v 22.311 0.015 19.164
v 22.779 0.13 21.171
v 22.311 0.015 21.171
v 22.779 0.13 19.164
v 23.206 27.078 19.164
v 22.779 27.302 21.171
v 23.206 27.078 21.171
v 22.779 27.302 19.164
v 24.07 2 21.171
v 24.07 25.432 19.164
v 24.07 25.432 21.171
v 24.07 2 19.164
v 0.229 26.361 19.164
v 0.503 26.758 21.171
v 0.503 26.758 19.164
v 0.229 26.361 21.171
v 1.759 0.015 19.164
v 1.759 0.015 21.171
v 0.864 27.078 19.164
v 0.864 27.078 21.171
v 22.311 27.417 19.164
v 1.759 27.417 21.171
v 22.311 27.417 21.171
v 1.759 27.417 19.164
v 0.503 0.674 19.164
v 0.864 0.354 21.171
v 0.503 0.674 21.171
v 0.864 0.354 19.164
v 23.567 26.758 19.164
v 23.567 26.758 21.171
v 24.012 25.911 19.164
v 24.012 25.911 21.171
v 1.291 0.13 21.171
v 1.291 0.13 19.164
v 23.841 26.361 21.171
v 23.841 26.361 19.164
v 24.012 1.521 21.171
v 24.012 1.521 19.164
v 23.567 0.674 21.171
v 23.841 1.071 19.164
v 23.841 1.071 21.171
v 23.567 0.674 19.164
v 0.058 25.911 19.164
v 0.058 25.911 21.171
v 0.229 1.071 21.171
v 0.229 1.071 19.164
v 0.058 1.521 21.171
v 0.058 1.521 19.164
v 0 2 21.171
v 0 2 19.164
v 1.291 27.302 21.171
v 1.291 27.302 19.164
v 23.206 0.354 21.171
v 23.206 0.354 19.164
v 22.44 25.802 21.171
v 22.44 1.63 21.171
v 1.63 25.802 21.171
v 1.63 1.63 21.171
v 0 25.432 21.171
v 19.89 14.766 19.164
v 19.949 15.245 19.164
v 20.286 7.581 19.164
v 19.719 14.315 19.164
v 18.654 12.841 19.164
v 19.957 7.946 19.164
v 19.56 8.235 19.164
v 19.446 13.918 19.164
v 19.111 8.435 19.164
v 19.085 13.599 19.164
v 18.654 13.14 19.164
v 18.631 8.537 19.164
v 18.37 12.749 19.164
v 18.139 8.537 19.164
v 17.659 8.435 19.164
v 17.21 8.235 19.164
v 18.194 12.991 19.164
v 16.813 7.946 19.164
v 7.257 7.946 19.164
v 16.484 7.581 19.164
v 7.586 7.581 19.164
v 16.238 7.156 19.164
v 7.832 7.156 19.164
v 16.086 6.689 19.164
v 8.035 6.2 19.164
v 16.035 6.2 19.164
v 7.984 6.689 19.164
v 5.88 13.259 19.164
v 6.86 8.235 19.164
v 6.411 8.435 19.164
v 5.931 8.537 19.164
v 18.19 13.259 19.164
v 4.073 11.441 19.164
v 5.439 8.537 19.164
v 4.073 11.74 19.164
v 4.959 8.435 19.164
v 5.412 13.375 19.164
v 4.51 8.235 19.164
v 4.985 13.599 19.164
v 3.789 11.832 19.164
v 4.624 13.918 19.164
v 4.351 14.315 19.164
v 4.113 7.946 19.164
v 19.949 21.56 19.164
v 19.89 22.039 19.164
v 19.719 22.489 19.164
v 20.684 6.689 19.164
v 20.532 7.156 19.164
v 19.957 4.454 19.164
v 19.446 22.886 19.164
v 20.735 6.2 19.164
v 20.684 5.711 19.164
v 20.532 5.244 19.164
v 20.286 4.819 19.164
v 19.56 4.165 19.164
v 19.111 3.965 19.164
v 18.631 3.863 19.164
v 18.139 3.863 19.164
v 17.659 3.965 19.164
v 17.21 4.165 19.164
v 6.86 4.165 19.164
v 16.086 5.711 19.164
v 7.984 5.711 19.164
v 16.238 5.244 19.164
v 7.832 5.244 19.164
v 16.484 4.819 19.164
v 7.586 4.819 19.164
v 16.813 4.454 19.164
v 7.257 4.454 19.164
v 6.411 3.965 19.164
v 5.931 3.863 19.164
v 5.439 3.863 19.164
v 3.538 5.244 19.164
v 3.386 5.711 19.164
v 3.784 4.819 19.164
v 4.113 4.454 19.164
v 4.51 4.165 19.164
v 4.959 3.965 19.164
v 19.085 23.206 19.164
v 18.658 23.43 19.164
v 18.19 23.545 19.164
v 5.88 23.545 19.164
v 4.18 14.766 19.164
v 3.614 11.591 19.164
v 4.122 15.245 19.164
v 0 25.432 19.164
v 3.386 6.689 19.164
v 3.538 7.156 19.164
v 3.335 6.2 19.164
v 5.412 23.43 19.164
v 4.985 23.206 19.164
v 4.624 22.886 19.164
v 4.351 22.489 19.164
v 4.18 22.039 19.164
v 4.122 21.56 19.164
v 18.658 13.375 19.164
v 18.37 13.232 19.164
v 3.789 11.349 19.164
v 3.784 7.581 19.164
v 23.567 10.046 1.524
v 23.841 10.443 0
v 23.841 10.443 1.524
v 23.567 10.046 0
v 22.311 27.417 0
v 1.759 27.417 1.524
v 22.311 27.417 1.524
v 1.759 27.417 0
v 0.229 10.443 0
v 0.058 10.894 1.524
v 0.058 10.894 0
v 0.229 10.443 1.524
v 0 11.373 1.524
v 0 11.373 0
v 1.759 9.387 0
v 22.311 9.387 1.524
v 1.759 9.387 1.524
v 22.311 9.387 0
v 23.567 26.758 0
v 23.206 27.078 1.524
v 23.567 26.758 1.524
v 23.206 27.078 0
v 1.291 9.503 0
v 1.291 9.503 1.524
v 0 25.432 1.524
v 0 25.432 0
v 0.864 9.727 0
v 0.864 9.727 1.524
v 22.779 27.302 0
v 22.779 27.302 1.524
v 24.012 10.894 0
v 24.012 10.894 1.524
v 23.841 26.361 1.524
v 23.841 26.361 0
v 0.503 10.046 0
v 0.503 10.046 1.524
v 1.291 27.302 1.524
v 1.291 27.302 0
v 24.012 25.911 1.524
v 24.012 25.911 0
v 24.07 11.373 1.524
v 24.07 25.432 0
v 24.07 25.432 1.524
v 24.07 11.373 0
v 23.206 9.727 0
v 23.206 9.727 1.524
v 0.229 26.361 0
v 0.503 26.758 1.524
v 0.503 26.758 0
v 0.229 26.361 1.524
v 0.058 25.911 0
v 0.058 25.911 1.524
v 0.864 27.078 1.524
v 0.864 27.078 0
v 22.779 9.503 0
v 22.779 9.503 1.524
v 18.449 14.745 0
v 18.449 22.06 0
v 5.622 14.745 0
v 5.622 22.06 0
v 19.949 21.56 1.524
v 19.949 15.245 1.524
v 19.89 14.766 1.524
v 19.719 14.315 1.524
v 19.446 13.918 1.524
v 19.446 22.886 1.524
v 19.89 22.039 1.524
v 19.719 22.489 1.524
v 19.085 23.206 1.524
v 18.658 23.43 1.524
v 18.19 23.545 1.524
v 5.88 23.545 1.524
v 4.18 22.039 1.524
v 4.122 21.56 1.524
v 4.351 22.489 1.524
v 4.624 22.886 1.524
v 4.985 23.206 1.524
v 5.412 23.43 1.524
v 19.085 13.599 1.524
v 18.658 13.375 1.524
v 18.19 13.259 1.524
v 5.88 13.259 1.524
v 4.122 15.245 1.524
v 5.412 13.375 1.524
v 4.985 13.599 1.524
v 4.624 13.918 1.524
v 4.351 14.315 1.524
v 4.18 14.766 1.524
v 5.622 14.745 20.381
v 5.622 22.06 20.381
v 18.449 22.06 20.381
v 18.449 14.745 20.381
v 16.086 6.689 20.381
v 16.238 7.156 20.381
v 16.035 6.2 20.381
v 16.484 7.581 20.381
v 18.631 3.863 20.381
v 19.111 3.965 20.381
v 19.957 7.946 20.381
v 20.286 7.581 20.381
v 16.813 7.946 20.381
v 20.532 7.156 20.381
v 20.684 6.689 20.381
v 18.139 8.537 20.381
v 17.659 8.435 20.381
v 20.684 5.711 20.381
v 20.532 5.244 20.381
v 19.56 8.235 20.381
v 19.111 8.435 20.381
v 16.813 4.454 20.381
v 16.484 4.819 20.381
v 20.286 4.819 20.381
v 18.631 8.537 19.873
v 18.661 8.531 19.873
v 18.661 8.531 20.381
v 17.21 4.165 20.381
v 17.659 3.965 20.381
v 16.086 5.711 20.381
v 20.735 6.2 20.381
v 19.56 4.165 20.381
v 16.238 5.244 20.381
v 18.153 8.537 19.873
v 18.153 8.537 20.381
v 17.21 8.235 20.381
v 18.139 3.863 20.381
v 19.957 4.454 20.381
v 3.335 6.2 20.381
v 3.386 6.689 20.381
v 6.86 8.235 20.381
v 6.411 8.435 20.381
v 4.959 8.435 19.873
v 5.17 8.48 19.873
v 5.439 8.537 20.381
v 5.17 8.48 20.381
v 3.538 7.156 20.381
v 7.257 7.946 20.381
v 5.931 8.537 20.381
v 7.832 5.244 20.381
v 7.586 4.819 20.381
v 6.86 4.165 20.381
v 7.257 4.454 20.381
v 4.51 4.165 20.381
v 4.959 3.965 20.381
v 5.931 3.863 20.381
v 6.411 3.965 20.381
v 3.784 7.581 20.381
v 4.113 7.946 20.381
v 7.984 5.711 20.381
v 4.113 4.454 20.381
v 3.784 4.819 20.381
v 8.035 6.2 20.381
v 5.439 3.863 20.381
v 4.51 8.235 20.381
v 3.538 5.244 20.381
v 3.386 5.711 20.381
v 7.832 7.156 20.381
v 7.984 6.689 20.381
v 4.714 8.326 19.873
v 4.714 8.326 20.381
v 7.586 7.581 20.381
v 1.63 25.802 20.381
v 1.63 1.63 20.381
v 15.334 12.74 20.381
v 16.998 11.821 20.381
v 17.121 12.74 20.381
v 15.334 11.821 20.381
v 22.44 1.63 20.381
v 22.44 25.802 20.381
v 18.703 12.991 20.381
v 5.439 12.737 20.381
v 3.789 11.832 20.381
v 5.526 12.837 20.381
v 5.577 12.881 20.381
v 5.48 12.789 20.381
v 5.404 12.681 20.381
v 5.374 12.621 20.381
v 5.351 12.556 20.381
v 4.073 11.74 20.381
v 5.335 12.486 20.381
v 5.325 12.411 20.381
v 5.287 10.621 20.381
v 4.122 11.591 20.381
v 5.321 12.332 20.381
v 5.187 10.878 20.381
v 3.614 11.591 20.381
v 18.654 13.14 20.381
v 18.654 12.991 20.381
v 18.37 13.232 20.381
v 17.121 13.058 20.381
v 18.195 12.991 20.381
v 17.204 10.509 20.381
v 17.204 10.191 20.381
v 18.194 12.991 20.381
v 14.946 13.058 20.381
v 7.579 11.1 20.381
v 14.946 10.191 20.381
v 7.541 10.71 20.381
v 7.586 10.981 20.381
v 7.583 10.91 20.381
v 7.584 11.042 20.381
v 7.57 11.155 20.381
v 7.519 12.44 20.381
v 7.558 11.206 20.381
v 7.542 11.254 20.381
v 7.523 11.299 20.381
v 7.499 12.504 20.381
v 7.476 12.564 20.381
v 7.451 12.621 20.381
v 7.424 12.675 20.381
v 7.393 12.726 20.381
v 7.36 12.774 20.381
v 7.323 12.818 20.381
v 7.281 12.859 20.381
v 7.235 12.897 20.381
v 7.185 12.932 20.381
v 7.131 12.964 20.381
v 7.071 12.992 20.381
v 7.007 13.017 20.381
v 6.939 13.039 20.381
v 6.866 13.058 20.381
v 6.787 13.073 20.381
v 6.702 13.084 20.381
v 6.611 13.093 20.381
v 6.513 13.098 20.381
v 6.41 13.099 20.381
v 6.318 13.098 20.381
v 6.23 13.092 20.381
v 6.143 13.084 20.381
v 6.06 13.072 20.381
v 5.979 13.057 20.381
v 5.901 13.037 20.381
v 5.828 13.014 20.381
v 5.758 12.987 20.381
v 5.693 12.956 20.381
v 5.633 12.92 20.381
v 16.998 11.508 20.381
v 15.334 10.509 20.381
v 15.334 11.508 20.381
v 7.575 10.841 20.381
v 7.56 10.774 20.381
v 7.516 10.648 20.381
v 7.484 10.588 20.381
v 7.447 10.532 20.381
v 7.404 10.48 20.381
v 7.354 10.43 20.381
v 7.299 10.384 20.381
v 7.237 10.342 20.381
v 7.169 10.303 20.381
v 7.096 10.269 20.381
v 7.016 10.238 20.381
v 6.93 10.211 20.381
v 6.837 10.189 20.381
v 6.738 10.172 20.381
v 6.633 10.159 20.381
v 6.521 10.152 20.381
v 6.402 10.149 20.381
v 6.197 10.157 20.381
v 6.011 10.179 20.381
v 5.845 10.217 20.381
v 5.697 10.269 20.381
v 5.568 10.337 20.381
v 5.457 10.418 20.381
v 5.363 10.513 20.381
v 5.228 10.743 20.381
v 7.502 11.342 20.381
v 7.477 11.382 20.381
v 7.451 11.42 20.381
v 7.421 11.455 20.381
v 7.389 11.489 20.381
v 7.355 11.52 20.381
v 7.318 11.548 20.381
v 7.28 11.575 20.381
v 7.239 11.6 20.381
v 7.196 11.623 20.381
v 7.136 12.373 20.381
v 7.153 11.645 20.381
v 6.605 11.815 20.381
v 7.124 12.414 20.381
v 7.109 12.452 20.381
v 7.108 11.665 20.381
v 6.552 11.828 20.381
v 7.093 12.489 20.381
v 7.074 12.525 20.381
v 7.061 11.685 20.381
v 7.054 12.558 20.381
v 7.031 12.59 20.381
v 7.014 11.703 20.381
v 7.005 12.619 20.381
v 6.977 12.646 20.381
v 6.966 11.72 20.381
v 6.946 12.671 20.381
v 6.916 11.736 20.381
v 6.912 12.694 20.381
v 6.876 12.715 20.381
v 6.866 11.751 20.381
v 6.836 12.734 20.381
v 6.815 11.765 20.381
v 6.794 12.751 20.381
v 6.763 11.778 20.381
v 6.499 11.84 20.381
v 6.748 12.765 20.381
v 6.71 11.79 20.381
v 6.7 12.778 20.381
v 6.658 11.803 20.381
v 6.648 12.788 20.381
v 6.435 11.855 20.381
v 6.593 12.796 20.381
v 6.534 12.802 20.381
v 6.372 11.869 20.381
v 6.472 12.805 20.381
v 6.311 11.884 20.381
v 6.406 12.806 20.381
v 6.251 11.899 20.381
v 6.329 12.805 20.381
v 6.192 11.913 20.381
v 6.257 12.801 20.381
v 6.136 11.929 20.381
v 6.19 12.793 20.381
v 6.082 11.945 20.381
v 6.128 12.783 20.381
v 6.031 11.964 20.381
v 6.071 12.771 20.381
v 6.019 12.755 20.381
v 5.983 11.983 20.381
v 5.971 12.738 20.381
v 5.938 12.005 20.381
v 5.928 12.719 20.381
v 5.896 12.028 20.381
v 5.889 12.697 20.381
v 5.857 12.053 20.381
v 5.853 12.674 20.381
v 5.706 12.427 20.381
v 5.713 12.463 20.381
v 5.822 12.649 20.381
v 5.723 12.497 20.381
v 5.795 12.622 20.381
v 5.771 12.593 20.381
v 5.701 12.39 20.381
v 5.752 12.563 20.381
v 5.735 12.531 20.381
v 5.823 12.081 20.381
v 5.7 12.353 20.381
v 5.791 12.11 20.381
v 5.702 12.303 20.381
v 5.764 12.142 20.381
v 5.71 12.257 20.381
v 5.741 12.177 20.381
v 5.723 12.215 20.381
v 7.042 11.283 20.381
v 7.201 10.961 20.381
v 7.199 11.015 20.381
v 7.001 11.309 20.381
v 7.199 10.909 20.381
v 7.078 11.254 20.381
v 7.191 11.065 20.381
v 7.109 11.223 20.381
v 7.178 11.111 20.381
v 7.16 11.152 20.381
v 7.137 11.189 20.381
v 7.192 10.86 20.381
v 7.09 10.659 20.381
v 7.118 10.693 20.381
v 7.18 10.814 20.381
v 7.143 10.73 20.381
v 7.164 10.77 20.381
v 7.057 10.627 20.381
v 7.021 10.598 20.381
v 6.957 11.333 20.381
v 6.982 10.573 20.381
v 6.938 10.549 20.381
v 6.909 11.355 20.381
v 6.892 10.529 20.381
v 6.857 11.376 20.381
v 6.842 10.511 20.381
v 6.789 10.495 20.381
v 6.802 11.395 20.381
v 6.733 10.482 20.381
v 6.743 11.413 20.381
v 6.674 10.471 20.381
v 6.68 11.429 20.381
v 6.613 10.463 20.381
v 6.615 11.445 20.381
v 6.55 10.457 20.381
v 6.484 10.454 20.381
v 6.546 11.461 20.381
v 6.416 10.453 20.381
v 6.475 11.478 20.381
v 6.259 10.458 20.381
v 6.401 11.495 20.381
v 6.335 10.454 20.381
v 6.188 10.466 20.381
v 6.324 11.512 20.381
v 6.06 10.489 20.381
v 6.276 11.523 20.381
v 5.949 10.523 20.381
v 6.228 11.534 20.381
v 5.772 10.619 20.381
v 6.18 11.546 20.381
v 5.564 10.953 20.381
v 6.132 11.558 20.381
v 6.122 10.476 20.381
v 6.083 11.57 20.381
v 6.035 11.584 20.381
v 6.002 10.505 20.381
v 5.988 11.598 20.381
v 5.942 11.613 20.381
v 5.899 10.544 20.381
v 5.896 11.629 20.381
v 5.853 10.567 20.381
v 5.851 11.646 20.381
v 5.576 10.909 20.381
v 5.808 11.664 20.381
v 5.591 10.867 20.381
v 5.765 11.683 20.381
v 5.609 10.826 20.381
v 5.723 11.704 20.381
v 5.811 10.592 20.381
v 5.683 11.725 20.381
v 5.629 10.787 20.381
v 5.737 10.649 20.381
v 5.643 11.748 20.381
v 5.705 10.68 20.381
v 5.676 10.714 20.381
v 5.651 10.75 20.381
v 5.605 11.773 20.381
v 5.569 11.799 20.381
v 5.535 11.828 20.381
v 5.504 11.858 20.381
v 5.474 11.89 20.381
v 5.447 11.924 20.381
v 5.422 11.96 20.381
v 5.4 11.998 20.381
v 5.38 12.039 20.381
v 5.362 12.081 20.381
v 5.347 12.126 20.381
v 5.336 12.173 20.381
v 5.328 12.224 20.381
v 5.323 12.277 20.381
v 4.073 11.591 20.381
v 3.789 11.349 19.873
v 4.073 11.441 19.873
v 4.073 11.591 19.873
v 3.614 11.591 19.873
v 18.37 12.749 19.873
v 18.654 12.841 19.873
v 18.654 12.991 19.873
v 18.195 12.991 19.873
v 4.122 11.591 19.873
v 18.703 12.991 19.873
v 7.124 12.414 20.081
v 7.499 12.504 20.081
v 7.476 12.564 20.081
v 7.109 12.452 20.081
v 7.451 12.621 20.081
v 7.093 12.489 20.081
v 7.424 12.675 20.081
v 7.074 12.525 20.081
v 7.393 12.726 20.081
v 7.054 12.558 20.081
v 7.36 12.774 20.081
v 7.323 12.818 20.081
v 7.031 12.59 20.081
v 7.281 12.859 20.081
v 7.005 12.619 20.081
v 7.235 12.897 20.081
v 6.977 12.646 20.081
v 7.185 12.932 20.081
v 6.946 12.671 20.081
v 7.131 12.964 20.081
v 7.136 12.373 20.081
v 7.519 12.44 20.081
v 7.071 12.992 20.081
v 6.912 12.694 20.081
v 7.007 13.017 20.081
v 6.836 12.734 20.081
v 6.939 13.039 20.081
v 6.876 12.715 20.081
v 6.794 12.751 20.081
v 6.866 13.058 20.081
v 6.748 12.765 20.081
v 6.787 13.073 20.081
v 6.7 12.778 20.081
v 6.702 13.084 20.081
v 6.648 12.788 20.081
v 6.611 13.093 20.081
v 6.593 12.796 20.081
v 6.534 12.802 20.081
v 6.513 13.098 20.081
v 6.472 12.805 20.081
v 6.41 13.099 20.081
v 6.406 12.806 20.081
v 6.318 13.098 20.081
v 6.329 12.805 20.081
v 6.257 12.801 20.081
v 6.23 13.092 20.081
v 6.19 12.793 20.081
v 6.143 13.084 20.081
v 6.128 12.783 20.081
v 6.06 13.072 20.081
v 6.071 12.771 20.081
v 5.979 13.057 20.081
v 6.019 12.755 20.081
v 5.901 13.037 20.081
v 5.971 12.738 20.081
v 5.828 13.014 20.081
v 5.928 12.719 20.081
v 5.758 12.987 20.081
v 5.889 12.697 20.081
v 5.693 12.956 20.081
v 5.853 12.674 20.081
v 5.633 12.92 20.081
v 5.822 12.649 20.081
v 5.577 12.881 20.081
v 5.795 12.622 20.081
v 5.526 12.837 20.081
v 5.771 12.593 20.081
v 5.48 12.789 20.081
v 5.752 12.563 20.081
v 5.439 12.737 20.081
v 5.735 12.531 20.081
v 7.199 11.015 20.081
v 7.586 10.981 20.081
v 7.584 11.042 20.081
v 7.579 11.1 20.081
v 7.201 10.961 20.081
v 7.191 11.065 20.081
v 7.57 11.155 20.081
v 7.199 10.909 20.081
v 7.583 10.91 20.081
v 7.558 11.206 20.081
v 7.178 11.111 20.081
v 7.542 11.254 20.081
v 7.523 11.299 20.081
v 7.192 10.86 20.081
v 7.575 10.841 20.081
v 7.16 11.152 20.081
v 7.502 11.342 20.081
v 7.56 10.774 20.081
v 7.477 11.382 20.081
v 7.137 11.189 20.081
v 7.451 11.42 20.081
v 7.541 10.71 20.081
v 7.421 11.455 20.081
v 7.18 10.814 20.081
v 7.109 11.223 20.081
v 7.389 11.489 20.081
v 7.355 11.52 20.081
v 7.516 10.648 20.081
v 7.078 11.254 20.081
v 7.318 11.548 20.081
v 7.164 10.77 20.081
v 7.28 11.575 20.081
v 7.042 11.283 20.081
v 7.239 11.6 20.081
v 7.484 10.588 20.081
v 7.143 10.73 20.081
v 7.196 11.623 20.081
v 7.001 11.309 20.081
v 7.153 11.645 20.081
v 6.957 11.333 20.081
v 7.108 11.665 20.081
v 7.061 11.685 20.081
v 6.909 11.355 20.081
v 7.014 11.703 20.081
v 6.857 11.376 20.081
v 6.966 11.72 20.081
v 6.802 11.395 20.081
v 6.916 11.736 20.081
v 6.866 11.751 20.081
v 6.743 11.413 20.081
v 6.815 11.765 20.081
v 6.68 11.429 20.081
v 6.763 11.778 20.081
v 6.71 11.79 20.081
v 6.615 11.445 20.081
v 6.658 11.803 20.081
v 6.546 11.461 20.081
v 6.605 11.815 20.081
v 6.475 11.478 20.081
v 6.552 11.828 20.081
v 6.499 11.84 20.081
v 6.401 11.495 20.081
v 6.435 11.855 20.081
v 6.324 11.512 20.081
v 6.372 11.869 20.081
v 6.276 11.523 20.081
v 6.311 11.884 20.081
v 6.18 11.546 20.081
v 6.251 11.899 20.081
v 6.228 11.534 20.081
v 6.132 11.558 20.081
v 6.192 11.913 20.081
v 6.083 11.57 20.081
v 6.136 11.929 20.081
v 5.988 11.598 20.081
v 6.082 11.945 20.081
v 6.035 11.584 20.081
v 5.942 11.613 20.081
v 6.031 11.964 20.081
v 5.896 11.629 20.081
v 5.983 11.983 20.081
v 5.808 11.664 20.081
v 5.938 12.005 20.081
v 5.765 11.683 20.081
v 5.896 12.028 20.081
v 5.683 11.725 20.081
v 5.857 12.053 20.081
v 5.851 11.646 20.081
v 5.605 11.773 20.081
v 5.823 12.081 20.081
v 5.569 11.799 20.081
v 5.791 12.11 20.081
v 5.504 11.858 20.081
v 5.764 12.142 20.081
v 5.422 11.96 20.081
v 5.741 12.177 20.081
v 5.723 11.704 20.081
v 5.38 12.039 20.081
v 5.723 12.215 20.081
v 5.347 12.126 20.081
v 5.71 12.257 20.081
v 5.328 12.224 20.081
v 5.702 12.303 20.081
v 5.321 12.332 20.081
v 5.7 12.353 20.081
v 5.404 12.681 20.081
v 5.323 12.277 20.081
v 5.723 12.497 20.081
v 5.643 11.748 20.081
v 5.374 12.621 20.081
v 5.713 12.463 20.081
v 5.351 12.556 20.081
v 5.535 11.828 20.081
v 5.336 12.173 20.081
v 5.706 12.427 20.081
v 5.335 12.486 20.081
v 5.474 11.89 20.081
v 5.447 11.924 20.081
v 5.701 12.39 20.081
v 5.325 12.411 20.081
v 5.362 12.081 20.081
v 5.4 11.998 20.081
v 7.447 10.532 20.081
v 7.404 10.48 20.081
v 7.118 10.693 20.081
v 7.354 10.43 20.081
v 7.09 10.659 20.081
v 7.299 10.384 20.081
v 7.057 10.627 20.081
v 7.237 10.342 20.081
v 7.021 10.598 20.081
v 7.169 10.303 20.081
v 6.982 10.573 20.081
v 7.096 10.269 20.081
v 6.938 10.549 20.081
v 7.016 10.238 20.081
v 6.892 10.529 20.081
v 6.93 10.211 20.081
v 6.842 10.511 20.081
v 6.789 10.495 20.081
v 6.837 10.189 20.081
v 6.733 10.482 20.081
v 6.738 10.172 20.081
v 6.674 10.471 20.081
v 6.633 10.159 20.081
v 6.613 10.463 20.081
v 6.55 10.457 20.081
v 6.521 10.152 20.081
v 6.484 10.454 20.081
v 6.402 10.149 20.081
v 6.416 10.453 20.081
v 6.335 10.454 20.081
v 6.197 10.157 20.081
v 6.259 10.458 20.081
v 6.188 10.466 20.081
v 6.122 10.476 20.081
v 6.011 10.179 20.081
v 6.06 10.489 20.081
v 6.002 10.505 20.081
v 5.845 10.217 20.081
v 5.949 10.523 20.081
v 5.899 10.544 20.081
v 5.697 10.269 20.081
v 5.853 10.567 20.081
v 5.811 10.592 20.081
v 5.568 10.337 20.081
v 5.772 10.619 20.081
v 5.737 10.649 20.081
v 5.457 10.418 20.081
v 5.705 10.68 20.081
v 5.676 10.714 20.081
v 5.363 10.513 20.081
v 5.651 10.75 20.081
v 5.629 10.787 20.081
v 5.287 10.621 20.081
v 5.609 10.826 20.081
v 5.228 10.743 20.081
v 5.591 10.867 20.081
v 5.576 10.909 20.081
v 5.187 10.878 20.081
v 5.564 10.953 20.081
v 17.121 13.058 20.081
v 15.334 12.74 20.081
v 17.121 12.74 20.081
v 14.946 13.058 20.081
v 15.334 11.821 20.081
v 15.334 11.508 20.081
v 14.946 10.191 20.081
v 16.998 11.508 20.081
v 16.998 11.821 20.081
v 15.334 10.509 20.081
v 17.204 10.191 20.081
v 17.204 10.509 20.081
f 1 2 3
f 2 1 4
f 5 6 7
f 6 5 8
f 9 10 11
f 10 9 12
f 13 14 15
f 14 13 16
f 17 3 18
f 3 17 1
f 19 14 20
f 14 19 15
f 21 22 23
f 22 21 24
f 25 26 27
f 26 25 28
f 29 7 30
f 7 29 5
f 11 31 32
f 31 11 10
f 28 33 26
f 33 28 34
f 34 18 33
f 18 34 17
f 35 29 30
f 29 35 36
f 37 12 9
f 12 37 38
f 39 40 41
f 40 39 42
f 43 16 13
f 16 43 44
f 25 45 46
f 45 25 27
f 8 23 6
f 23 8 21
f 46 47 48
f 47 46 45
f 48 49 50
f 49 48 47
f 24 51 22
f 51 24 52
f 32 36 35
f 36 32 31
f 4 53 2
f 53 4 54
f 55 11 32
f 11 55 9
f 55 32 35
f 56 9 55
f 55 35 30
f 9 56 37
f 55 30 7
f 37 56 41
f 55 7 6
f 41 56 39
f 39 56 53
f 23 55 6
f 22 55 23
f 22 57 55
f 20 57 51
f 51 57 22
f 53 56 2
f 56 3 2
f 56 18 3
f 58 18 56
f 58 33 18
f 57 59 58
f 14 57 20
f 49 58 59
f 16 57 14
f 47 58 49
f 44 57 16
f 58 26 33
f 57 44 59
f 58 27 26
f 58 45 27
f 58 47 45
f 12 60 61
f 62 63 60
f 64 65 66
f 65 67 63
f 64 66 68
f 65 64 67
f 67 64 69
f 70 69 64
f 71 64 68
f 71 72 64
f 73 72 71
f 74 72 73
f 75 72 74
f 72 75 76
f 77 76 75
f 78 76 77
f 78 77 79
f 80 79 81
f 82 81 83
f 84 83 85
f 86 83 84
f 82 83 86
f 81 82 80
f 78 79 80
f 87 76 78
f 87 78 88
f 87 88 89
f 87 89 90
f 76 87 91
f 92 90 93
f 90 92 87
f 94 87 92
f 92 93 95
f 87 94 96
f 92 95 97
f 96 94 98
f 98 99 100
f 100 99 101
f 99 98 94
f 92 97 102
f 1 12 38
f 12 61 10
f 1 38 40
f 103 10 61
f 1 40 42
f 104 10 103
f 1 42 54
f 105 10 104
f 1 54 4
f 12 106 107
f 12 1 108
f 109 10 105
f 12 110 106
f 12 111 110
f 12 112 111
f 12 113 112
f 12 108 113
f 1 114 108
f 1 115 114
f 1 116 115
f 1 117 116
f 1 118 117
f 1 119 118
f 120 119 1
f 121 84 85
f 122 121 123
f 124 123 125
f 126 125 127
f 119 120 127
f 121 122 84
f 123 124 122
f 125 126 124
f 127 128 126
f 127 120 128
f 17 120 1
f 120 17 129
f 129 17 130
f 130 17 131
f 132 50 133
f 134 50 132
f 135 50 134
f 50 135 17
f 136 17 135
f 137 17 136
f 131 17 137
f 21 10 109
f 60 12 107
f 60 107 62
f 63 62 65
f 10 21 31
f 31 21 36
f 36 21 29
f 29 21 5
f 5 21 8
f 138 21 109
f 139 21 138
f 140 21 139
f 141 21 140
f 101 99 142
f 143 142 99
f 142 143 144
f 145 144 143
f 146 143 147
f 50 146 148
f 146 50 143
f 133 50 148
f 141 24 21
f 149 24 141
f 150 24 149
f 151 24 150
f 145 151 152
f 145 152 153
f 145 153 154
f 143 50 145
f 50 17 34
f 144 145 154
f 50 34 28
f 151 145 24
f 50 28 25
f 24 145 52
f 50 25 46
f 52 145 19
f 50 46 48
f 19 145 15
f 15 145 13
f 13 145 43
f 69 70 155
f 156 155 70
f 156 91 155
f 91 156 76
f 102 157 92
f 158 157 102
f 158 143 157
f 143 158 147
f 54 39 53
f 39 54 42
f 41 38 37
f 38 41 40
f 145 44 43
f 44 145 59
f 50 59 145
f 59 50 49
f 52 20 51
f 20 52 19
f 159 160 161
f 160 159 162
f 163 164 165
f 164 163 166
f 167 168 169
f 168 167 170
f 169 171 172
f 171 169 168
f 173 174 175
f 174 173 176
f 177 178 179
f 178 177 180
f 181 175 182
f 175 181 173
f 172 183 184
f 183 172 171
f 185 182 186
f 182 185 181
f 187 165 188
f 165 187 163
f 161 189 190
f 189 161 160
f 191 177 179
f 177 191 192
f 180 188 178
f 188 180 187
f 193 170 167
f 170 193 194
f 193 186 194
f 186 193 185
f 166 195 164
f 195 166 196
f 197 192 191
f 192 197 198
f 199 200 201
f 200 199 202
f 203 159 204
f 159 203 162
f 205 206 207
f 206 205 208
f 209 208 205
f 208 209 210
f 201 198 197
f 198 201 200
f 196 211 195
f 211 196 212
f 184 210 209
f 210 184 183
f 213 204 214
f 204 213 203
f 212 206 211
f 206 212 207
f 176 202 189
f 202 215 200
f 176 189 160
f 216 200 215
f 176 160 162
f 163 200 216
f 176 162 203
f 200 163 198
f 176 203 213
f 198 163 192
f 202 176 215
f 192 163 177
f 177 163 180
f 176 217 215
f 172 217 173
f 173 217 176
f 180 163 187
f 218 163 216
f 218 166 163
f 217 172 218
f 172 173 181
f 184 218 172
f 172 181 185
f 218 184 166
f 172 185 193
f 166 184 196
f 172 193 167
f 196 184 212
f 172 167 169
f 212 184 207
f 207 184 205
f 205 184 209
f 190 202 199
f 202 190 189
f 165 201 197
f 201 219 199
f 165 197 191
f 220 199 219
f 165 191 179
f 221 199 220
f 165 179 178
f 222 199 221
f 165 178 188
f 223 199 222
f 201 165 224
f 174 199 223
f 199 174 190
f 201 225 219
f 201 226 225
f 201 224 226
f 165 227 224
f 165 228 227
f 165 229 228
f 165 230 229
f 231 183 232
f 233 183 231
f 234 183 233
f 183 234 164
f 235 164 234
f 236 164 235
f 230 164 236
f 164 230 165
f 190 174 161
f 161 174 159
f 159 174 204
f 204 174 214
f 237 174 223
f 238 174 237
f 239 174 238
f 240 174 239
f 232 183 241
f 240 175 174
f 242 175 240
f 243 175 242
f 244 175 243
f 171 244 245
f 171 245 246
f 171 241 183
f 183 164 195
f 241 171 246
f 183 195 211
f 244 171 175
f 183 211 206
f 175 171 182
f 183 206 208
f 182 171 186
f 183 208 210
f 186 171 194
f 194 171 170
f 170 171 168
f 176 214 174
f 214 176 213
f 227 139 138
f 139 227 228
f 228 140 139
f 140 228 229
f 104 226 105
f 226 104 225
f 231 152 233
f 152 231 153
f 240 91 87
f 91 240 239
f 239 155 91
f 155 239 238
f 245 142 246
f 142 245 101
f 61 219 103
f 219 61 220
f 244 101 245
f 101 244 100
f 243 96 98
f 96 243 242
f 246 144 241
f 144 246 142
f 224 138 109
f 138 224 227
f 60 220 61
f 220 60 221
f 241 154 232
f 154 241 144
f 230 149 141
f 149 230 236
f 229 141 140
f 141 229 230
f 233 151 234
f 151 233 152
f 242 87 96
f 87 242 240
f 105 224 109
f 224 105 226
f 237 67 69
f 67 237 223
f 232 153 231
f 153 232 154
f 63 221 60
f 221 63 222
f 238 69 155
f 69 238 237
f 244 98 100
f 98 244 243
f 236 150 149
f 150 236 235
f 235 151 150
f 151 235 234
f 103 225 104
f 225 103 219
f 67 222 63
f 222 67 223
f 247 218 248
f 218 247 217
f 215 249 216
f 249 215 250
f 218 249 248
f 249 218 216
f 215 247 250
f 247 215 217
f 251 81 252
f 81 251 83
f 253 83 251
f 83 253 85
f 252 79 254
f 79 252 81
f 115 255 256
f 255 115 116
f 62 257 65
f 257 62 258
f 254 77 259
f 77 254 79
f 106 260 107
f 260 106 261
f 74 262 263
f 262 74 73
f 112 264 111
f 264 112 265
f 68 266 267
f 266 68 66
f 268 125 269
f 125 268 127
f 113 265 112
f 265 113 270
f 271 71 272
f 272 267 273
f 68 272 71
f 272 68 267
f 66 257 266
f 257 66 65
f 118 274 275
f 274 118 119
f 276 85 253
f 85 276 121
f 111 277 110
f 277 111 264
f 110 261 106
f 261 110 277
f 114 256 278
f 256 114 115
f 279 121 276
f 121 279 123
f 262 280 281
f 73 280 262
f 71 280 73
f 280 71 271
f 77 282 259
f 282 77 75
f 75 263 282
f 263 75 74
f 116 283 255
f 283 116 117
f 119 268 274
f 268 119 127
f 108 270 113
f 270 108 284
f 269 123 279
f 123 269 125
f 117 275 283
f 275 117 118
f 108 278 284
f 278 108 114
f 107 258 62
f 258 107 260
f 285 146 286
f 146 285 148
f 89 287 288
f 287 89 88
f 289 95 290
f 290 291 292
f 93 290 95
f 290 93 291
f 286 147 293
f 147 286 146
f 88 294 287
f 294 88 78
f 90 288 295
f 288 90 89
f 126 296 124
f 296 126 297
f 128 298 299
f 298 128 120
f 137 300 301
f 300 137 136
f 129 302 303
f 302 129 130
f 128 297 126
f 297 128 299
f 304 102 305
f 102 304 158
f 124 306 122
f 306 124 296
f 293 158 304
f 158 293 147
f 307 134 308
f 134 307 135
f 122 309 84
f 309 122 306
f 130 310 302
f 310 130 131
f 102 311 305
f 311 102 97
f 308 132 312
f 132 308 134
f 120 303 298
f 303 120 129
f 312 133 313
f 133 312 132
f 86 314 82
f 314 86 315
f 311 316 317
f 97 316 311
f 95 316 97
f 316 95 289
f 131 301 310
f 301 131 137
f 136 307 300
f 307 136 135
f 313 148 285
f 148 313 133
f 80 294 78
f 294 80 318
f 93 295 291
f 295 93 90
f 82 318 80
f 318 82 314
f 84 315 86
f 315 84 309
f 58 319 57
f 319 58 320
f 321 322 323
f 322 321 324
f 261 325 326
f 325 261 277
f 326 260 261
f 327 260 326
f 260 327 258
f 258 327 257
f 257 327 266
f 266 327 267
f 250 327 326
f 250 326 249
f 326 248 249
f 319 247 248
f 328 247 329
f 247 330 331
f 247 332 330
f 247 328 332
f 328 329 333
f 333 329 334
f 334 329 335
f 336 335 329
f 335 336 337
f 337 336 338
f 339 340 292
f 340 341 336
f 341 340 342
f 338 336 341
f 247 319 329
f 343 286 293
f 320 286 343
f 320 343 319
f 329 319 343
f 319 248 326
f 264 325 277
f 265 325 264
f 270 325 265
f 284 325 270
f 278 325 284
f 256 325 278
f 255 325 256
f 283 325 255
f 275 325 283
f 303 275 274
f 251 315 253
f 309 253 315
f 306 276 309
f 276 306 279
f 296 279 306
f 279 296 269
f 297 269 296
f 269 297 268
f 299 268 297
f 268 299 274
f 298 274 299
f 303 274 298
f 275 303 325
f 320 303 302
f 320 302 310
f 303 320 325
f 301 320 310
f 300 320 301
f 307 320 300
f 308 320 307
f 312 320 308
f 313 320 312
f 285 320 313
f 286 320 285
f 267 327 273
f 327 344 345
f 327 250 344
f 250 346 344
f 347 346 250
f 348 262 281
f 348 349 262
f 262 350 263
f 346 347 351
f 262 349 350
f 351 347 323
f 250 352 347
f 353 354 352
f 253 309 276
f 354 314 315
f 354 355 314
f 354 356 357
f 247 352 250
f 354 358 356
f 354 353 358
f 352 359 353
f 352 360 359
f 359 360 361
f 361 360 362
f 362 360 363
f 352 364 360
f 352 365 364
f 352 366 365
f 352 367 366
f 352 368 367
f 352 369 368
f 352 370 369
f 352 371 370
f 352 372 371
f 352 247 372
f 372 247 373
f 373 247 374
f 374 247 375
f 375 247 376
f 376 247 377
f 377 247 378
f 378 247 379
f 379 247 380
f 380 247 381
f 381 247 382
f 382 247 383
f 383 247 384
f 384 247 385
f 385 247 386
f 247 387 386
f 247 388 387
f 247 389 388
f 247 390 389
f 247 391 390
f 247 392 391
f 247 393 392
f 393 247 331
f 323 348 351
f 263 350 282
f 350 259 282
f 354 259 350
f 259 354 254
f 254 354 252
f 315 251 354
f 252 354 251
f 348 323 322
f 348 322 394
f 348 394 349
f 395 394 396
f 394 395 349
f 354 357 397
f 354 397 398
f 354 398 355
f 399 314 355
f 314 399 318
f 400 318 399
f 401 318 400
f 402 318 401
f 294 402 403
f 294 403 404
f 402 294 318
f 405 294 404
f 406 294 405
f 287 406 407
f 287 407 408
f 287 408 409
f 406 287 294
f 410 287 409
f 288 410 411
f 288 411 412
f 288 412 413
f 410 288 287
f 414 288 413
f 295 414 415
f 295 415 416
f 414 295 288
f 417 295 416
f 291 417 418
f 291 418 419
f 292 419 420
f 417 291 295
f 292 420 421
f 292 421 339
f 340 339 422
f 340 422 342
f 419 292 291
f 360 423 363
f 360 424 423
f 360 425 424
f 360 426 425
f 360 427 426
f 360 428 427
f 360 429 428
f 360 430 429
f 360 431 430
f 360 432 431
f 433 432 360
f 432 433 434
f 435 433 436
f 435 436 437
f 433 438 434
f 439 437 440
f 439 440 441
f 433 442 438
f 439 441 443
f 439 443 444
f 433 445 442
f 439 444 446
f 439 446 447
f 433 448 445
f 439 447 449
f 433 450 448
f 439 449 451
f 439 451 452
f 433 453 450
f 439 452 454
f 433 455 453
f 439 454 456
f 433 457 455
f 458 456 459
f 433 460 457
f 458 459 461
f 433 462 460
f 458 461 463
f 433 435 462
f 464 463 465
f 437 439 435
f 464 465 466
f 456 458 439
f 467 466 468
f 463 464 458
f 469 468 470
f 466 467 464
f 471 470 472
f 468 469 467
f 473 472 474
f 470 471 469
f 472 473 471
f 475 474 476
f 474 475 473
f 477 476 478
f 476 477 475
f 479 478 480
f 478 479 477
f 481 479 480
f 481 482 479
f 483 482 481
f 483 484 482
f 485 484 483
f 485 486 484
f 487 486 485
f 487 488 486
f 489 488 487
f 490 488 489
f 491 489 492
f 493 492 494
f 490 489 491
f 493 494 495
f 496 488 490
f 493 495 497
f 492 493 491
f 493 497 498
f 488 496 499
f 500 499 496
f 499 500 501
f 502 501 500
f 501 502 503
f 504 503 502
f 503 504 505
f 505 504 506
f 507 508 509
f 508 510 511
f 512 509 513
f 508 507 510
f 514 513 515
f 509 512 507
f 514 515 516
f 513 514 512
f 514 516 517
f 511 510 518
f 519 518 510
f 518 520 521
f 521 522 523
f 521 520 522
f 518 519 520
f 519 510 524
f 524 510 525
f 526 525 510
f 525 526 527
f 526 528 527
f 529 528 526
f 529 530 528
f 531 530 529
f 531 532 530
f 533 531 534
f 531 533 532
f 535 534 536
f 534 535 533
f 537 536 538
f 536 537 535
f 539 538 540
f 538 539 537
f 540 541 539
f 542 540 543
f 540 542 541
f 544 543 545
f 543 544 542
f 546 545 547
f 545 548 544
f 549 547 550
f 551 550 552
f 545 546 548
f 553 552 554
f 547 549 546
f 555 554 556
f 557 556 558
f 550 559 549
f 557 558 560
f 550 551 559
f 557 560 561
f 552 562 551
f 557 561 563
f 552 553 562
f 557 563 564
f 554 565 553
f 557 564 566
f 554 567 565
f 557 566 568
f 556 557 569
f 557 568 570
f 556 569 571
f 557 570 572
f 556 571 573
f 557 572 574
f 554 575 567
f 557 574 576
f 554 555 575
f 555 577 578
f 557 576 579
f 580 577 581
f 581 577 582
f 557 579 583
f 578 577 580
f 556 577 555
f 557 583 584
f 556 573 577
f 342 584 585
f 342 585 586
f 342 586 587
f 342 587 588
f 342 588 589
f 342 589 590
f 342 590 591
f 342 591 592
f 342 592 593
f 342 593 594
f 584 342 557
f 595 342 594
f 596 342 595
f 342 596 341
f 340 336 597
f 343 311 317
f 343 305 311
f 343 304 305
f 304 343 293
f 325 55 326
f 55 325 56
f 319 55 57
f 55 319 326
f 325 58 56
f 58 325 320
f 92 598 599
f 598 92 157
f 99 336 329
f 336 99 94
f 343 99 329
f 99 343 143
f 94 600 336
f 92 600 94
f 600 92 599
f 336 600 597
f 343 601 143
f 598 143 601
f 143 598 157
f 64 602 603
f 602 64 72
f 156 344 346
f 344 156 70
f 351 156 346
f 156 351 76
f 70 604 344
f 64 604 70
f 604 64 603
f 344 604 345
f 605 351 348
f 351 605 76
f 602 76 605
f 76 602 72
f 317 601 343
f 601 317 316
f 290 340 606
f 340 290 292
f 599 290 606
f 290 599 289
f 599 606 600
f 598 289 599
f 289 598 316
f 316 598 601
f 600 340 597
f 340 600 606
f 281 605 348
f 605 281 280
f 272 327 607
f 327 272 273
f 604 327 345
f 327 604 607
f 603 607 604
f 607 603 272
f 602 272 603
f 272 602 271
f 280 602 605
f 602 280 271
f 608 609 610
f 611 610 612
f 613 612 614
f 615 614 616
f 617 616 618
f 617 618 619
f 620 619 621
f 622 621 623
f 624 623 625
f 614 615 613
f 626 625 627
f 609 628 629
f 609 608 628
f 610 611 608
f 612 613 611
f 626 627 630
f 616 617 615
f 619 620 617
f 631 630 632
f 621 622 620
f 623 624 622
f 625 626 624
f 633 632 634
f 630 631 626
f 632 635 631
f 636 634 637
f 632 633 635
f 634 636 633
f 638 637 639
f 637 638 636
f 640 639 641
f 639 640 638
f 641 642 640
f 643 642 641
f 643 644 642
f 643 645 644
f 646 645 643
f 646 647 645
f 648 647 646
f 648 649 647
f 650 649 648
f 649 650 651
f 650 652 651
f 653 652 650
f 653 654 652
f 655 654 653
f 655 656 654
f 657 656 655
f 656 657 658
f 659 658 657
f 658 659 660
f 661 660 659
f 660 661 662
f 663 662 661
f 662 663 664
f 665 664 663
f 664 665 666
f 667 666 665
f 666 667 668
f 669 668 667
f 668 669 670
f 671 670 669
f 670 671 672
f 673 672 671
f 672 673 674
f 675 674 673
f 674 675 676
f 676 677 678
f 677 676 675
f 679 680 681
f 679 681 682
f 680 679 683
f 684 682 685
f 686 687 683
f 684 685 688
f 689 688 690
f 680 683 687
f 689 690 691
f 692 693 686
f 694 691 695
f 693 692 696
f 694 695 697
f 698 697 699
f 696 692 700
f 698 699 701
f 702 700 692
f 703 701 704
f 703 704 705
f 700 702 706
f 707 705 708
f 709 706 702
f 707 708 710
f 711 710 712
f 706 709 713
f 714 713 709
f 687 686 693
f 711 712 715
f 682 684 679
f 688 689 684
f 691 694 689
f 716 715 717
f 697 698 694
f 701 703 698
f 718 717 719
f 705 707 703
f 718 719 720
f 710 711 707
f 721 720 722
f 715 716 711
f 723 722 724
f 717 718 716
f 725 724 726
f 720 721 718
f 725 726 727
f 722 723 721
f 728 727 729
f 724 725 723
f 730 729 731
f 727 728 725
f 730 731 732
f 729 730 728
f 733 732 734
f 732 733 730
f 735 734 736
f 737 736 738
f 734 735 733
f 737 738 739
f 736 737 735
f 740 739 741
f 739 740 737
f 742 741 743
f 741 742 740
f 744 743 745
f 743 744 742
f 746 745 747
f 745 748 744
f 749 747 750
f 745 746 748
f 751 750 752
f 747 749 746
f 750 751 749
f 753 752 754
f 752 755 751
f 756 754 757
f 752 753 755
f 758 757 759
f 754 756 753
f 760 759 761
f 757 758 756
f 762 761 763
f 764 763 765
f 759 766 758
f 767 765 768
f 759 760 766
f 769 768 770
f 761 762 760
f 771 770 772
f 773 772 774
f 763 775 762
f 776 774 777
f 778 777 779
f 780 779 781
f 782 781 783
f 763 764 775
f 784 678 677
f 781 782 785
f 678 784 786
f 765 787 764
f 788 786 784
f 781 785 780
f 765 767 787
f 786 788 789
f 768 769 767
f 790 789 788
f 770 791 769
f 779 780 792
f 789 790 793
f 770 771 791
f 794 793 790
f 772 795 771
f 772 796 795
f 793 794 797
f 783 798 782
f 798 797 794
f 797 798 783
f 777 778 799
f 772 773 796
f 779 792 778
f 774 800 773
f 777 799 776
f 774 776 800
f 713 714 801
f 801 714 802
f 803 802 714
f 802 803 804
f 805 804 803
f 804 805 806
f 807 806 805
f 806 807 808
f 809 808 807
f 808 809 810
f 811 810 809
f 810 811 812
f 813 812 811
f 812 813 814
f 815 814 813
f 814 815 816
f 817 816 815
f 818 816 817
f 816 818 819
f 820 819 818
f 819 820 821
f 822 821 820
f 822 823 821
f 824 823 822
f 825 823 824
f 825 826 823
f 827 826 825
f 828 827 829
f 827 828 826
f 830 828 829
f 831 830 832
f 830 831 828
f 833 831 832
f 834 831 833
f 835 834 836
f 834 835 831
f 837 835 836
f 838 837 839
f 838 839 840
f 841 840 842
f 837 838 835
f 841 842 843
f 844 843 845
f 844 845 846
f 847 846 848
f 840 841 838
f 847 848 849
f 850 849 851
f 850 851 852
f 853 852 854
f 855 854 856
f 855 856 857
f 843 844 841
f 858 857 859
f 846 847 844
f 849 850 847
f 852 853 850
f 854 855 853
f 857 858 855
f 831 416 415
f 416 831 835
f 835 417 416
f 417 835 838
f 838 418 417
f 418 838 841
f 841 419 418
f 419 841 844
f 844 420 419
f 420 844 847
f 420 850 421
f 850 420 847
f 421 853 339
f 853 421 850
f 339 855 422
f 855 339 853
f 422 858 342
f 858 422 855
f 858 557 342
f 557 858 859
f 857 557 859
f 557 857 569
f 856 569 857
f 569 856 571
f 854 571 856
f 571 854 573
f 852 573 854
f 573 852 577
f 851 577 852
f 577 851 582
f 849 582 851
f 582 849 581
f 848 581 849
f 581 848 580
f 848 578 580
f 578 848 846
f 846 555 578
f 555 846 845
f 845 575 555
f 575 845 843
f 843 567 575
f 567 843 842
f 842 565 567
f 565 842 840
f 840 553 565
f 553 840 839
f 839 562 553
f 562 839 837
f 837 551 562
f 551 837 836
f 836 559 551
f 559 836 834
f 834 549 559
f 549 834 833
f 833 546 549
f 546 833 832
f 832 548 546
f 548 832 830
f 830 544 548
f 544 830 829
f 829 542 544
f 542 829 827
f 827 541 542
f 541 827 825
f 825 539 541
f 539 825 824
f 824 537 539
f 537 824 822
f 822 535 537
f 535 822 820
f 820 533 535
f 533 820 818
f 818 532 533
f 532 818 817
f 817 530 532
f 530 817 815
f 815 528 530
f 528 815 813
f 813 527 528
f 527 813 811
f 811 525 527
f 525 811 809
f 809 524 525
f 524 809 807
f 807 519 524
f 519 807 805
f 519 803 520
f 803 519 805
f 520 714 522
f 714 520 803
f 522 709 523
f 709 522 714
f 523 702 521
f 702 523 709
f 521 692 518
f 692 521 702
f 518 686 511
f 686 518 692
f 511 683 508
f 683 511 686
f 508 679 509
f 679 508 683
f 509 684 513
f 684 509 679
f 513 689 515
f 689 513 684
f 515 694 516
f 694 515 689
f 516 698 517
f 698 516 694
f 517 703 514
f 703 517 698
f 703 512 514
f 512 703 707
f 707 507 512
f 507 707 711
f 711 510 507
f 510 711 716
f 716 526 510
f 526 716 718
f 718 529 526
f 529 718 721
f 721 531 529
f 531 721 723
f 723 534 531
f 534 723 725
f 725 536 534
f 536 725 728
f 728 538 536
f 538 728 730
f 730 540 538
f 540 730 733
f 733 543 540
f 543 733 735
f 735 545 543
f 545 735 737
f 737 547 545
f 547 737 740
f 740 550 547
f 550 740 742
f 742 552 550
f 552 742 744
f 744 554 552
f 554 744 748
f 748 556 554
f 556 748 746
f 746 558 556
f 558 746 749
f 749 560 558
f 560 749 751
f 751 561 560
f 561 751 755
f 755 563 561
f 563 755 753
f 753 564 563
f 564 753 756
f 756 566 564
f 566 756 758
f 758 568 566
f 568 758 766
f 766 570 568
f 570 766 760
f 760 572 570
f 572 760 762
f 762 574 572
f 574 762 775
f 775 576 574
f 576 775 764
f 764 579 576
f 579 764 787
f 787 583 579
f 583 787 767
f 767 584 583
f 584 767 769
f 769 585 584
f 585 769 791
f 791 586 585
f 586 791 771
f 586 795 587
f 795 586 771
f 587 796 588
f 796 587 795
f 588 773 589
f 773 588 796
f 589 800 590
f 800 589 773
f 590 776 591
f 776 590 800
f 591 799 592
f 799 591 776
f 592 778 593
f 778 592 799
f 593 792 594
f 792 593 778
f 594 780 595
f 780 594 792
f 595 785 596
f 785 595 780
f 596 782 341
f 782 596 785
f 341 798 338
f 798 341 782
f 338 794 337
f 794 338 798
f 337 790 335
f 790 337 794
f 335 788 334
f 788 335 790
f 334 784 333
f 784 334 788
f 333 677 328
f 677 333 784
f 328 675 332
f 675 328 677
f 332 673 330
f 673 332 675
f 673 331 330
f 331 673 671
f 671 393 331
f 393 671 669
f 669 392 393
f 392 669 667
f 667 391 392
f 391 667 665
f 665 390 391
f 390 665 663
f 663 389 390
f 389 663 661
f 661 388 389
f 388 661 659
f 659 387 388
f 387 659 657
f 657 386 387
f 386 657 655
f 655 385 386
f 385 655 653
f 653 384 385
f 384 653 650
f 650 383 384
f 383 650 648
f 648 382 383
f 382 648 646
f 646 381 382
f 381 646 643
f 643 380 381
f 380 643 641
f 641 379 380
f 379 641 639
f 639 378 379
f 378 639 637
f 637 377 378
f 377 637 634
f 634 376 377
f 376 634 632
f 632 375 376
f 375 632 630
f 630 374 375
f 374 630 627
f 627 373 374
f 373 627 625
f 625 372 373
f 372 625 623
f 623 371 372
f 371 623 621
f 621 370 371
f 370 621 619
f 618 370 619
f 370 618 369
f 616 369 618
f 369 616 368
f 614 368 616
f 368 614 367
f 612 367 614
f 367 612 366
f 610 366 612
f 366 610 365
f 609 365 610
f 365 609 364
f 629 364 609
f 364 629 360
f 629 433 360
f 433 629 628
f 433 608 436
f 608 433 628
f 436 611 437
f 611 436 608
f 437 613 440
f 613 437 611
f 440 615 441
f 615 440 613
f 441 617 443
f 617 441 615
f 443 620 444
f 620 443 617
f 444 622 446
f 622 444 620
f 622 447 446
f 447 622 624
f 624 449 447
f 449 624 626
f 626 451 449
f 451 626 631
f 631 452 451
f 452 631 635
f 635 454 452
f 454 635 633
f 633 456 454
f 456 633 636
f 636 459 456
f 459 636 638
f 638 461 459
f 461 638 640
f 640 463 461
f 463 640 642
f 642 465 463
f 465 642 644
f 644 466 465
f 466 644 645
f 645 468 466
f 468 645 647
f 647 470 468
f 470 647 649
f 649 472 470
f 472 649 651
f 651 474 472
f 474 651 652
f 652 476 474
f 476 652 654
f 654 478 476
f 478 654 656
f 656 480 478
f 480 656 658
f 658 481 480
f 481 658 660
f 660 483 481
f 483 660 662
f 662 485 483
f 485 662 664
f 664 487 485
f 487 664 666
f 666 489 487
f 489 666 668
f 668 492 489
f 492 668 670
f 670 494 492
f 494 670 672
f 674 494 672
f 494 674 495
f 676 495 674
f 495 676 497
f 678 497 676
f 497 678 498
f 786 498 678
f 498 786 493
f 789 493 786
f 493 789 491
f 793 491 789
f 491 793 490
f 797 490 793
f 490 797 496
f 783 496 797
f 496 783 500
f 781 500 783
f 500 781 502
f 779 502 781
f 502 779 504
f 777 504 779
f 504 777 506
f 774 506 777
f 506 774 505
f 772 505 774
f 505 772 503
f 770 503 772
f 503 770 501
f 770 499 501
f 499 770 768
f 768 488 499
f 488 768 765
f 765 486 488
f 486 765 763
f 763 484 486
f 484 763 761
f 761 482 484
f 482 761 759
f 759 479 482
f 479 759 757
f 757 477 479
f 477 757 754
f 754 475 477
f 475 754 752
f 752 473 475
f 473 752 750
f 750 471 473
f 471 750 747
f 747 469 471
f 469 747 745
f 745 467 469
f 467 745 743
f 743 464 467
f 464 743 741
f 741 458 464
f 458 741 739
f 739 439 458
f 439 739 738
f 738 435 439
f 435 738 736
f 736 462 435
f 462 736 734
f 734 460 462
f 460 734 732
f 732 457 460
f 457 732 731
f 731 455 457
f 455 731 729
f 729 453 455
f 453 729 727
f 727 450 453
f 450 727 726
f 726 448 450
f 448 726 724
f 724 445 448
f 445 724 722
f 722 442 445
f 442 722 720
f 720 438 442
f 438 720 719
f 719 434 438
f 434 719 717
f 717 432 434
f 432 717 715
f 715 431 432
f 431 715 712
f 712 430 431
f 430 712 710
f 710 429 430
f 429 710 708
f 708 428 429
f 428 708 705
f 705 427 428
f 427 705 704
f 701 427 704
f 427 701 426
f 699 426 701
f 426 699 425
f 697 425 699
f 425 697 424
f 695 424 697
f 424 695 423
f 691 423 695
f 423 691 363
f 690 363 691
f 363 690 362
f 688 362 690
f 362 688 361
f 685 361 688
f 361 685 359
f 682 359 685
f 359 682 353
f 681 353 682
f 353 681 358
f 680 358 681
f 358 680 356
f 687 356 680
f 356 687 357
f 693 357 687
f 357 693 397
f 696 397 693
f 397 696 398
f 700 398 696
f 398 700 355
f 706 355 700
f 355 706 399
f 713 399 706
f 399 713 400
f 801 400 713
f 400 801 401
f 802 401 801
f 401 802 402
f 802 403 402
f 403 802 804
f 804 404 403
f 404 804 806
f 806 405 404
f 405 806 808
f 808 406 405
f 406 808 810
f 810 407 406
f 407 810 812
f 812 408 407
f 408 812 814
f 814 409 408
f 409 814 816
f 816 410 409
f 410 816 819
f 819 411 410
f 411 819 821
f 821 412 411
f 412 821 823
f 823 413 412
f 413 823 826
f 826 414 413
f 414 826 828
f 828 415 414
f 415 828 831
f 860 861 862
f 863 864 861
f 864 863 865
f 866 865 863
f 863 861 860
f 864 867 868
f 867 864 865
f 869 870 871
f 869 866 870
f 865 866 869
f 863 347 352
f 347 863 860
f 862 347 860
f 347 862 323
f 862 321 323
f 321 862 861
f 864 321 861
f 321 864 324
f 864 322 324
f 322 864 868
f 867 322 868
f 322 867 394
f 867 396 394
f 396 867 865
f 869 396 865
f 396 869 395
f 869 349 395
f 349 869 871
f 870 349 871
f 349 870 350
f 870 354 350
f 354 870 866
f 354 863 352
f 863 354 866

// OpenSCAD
// PN 520 rectangular coil plastic former
//
// May 3, 2018 WH - code cleanup and dimension adjustments

base_up=true;          // set to true to print the base on top
                       // or false to print the base on bottom

module rectangular_coil_form(base_up) {

  $fs=0.5;
  $fa=1;
  inch=25.4;
  eps=0.05;

  // rectangular coil form constants
  rad=2;                    // corner radius
  base_thick=0.079*inch;
  base_depth=1.080*inch;    // depth (Y) of top
  width=24.07;              // width (X) of top and bottom
  top_thick=0.060*inch;
  top_depth=0.711*inch;          // depth (Y) of top
  height=0.8335*inch;       // overall height (Z)

  chimney_width=0.505*inch; // chimney interior width
  chimney_depth=0.288*inch; // chimney interior depth
  chimney_thick=1.5;        // guess at chimney wall thickness (from cylindrical coil)

  eye_rad=4.7/2;            // eyelet radius
  eye_depth=6.2;            // offset from front
  eye_spacing=inch/2;       // 0.5" apart

  base_cutout_height=0.79;
  base_cutout_border=1.63;

  coil_thickness=1.4;
  wire_rad=0.020*inch/2;    // 200% of 30AWG radius
  wire_guide_depth=2*wire_rad;
  wire_e_x=(width-chimney_width)/2;
  wire_e_y=base_depth-top_depth+(top_depth-chimney_depth)/2-chimney_thick-wire_rad;
  wire_s_x=(width+chimney_width)/2+chimney_thick+wire_rad;
  wire_s_y=wire_e_y-coil_thickness;

  text_depth=0.3;
  text_ascent=3;

  module rectangular_coil_form_base_down() {

  // add the bottom, top and chimney together
  // then subtract the chimney interior, eyelet
    // and wire holes, wire conduits and base cutout
    difference() {
      union() {
        // bottom
        hull() {
          translate([rad,rad,0])
            cylinder(h=base_thick,r=rad);
          translate([width-rad,rad,0])
            cylinder(h=base_thick,r=rad);
          translate([rad,base_depth-rad,0])
            cylinder(h=base_thick,r=rad);
          translate([width-rad,base_depth-rad,0])
            cylinder(h=base_thick,r=rad);
        }
        // top
        translate([0,base_depth-top_depth,height-top_thick]) hull() {
          translate([rad,rad,0])
           cylinder(h=top_thick,r=rad);
          translate([width-rad,rad,0])
            cylinder(h=top_thick,r=rad);
          translate([rad,top_depth-rad,0])
            cylinder(h=top_thick,r=rad);
          translate([width-rad,top_depth-rad,0])
            cylinder(h=top_thick,r=rad);
        }
        // chimney outside
        translate([(width-chimney_width)/2-chimney_thick,base_depth-top_depth+(top_depth-chimney_depth)/2-chimney_thick,0]) 
          hull() {
            translate([rad,rad,0])
              cylinder(h=height,r=rad);
            translate([chimney_width+2*chimney_thick-rad,rad,0])
              cylinder(h=height,r=rad);
            translate([rad,chimney_depth+2*chimney_thick-rad,0])
              cylinder(h=height,r=rad);
            translate([chimney_width+2*chimney_thick-rad,chimney_depth+2*chimney_thick-rad,0])
              cylinder(h=height,r=rad);
          }
      }
      // remove chimney interior
      translate([(width-chimney_width)/2,base_depth-(top_depth+chimney_depth)/2,-eps])
        cube([chimney_width,chimney_depth,height+2*eps]);
      // remove left eyelet
      translate([(width-eye_spacing)/2,eye_depth,-eps])
        cylinder(h=base_thick+2*eps,r=eye_rad);
      // remove right eyelet
      translate([(width+eye_spacing)/2,eye_depth,-eps])
        cylinder(h=base_thick+2*eps,r=eye_rad);
      // remove base cutout
      translate([base_cutout_border,base_cutout_border,-eps])
        cube([width-2*base_cutout_border,base_depth-2*base_cutout_border,base_cutout_height+eps]);
      // remove S wire hole
      translate([wire_s_x,wire_s_y,-eps])
        cylinder(h=base_thick+2*eps,r=wire_rad);
      // remove E wire hole
      translate([wire_e_x,wire_e_y,-eps])
        cylinder(h=base_thick+2*eps,r=wire_rad);
      // remove S wire conduit
      linear_extrude(height=base_cutout_height+wire_guide_depth) 
        polygon([
          [wire_s_x+wire_rad,wire_s_y],
          [(width+eye_spacing)/2+wire_rad,eye_depth],
          [(width+eye_spacing)/2-wire_rad,eye_depth],
          [wire_s_x-wire_rad,wire_s_y]]);
      // remove E wire conduit
      linear_extrude(height=base_cutout_height+wire_guide_depth) 
        polygon([
          [wire_e_x+wire_rad,wire_e_y],
          [(width-eye_spacing)/2+wire_rad,eye_depth],
          [(width-eye_spacing)/2-wire_rad,eye_depth],
          [wire_e_x-wire_rad,wire_e_y]]);
      // remove coil text
      translate([wire_s_x,wire_s_y,base_cutout_height-eps])
        linear_extrude(height=text_depth+eps)
          rotate([0,180,0])
            text(" S",size=text_ascent,valign="center",halign="left");
      translate([wire_e_x,wire_e_y,base_cutout_height-eps])
        linear_extrude(height=text_depth+eps) 
          rotate([0,180,0])
            text("E ",size=text_ascent,valign="top",halign="right");
    }
  }
  if( base_up ) {
    // bottom detail seems to print better when it's on top
    // (at the expense of a crummy looking base top)
    translate([width,0,height])
      rotate([180,0,180])
        rectangular_coil_form_base_down();
  } else {
    rectangular_coil_form_base_down();
  }
}

rectangular_coil_form(base_up);
